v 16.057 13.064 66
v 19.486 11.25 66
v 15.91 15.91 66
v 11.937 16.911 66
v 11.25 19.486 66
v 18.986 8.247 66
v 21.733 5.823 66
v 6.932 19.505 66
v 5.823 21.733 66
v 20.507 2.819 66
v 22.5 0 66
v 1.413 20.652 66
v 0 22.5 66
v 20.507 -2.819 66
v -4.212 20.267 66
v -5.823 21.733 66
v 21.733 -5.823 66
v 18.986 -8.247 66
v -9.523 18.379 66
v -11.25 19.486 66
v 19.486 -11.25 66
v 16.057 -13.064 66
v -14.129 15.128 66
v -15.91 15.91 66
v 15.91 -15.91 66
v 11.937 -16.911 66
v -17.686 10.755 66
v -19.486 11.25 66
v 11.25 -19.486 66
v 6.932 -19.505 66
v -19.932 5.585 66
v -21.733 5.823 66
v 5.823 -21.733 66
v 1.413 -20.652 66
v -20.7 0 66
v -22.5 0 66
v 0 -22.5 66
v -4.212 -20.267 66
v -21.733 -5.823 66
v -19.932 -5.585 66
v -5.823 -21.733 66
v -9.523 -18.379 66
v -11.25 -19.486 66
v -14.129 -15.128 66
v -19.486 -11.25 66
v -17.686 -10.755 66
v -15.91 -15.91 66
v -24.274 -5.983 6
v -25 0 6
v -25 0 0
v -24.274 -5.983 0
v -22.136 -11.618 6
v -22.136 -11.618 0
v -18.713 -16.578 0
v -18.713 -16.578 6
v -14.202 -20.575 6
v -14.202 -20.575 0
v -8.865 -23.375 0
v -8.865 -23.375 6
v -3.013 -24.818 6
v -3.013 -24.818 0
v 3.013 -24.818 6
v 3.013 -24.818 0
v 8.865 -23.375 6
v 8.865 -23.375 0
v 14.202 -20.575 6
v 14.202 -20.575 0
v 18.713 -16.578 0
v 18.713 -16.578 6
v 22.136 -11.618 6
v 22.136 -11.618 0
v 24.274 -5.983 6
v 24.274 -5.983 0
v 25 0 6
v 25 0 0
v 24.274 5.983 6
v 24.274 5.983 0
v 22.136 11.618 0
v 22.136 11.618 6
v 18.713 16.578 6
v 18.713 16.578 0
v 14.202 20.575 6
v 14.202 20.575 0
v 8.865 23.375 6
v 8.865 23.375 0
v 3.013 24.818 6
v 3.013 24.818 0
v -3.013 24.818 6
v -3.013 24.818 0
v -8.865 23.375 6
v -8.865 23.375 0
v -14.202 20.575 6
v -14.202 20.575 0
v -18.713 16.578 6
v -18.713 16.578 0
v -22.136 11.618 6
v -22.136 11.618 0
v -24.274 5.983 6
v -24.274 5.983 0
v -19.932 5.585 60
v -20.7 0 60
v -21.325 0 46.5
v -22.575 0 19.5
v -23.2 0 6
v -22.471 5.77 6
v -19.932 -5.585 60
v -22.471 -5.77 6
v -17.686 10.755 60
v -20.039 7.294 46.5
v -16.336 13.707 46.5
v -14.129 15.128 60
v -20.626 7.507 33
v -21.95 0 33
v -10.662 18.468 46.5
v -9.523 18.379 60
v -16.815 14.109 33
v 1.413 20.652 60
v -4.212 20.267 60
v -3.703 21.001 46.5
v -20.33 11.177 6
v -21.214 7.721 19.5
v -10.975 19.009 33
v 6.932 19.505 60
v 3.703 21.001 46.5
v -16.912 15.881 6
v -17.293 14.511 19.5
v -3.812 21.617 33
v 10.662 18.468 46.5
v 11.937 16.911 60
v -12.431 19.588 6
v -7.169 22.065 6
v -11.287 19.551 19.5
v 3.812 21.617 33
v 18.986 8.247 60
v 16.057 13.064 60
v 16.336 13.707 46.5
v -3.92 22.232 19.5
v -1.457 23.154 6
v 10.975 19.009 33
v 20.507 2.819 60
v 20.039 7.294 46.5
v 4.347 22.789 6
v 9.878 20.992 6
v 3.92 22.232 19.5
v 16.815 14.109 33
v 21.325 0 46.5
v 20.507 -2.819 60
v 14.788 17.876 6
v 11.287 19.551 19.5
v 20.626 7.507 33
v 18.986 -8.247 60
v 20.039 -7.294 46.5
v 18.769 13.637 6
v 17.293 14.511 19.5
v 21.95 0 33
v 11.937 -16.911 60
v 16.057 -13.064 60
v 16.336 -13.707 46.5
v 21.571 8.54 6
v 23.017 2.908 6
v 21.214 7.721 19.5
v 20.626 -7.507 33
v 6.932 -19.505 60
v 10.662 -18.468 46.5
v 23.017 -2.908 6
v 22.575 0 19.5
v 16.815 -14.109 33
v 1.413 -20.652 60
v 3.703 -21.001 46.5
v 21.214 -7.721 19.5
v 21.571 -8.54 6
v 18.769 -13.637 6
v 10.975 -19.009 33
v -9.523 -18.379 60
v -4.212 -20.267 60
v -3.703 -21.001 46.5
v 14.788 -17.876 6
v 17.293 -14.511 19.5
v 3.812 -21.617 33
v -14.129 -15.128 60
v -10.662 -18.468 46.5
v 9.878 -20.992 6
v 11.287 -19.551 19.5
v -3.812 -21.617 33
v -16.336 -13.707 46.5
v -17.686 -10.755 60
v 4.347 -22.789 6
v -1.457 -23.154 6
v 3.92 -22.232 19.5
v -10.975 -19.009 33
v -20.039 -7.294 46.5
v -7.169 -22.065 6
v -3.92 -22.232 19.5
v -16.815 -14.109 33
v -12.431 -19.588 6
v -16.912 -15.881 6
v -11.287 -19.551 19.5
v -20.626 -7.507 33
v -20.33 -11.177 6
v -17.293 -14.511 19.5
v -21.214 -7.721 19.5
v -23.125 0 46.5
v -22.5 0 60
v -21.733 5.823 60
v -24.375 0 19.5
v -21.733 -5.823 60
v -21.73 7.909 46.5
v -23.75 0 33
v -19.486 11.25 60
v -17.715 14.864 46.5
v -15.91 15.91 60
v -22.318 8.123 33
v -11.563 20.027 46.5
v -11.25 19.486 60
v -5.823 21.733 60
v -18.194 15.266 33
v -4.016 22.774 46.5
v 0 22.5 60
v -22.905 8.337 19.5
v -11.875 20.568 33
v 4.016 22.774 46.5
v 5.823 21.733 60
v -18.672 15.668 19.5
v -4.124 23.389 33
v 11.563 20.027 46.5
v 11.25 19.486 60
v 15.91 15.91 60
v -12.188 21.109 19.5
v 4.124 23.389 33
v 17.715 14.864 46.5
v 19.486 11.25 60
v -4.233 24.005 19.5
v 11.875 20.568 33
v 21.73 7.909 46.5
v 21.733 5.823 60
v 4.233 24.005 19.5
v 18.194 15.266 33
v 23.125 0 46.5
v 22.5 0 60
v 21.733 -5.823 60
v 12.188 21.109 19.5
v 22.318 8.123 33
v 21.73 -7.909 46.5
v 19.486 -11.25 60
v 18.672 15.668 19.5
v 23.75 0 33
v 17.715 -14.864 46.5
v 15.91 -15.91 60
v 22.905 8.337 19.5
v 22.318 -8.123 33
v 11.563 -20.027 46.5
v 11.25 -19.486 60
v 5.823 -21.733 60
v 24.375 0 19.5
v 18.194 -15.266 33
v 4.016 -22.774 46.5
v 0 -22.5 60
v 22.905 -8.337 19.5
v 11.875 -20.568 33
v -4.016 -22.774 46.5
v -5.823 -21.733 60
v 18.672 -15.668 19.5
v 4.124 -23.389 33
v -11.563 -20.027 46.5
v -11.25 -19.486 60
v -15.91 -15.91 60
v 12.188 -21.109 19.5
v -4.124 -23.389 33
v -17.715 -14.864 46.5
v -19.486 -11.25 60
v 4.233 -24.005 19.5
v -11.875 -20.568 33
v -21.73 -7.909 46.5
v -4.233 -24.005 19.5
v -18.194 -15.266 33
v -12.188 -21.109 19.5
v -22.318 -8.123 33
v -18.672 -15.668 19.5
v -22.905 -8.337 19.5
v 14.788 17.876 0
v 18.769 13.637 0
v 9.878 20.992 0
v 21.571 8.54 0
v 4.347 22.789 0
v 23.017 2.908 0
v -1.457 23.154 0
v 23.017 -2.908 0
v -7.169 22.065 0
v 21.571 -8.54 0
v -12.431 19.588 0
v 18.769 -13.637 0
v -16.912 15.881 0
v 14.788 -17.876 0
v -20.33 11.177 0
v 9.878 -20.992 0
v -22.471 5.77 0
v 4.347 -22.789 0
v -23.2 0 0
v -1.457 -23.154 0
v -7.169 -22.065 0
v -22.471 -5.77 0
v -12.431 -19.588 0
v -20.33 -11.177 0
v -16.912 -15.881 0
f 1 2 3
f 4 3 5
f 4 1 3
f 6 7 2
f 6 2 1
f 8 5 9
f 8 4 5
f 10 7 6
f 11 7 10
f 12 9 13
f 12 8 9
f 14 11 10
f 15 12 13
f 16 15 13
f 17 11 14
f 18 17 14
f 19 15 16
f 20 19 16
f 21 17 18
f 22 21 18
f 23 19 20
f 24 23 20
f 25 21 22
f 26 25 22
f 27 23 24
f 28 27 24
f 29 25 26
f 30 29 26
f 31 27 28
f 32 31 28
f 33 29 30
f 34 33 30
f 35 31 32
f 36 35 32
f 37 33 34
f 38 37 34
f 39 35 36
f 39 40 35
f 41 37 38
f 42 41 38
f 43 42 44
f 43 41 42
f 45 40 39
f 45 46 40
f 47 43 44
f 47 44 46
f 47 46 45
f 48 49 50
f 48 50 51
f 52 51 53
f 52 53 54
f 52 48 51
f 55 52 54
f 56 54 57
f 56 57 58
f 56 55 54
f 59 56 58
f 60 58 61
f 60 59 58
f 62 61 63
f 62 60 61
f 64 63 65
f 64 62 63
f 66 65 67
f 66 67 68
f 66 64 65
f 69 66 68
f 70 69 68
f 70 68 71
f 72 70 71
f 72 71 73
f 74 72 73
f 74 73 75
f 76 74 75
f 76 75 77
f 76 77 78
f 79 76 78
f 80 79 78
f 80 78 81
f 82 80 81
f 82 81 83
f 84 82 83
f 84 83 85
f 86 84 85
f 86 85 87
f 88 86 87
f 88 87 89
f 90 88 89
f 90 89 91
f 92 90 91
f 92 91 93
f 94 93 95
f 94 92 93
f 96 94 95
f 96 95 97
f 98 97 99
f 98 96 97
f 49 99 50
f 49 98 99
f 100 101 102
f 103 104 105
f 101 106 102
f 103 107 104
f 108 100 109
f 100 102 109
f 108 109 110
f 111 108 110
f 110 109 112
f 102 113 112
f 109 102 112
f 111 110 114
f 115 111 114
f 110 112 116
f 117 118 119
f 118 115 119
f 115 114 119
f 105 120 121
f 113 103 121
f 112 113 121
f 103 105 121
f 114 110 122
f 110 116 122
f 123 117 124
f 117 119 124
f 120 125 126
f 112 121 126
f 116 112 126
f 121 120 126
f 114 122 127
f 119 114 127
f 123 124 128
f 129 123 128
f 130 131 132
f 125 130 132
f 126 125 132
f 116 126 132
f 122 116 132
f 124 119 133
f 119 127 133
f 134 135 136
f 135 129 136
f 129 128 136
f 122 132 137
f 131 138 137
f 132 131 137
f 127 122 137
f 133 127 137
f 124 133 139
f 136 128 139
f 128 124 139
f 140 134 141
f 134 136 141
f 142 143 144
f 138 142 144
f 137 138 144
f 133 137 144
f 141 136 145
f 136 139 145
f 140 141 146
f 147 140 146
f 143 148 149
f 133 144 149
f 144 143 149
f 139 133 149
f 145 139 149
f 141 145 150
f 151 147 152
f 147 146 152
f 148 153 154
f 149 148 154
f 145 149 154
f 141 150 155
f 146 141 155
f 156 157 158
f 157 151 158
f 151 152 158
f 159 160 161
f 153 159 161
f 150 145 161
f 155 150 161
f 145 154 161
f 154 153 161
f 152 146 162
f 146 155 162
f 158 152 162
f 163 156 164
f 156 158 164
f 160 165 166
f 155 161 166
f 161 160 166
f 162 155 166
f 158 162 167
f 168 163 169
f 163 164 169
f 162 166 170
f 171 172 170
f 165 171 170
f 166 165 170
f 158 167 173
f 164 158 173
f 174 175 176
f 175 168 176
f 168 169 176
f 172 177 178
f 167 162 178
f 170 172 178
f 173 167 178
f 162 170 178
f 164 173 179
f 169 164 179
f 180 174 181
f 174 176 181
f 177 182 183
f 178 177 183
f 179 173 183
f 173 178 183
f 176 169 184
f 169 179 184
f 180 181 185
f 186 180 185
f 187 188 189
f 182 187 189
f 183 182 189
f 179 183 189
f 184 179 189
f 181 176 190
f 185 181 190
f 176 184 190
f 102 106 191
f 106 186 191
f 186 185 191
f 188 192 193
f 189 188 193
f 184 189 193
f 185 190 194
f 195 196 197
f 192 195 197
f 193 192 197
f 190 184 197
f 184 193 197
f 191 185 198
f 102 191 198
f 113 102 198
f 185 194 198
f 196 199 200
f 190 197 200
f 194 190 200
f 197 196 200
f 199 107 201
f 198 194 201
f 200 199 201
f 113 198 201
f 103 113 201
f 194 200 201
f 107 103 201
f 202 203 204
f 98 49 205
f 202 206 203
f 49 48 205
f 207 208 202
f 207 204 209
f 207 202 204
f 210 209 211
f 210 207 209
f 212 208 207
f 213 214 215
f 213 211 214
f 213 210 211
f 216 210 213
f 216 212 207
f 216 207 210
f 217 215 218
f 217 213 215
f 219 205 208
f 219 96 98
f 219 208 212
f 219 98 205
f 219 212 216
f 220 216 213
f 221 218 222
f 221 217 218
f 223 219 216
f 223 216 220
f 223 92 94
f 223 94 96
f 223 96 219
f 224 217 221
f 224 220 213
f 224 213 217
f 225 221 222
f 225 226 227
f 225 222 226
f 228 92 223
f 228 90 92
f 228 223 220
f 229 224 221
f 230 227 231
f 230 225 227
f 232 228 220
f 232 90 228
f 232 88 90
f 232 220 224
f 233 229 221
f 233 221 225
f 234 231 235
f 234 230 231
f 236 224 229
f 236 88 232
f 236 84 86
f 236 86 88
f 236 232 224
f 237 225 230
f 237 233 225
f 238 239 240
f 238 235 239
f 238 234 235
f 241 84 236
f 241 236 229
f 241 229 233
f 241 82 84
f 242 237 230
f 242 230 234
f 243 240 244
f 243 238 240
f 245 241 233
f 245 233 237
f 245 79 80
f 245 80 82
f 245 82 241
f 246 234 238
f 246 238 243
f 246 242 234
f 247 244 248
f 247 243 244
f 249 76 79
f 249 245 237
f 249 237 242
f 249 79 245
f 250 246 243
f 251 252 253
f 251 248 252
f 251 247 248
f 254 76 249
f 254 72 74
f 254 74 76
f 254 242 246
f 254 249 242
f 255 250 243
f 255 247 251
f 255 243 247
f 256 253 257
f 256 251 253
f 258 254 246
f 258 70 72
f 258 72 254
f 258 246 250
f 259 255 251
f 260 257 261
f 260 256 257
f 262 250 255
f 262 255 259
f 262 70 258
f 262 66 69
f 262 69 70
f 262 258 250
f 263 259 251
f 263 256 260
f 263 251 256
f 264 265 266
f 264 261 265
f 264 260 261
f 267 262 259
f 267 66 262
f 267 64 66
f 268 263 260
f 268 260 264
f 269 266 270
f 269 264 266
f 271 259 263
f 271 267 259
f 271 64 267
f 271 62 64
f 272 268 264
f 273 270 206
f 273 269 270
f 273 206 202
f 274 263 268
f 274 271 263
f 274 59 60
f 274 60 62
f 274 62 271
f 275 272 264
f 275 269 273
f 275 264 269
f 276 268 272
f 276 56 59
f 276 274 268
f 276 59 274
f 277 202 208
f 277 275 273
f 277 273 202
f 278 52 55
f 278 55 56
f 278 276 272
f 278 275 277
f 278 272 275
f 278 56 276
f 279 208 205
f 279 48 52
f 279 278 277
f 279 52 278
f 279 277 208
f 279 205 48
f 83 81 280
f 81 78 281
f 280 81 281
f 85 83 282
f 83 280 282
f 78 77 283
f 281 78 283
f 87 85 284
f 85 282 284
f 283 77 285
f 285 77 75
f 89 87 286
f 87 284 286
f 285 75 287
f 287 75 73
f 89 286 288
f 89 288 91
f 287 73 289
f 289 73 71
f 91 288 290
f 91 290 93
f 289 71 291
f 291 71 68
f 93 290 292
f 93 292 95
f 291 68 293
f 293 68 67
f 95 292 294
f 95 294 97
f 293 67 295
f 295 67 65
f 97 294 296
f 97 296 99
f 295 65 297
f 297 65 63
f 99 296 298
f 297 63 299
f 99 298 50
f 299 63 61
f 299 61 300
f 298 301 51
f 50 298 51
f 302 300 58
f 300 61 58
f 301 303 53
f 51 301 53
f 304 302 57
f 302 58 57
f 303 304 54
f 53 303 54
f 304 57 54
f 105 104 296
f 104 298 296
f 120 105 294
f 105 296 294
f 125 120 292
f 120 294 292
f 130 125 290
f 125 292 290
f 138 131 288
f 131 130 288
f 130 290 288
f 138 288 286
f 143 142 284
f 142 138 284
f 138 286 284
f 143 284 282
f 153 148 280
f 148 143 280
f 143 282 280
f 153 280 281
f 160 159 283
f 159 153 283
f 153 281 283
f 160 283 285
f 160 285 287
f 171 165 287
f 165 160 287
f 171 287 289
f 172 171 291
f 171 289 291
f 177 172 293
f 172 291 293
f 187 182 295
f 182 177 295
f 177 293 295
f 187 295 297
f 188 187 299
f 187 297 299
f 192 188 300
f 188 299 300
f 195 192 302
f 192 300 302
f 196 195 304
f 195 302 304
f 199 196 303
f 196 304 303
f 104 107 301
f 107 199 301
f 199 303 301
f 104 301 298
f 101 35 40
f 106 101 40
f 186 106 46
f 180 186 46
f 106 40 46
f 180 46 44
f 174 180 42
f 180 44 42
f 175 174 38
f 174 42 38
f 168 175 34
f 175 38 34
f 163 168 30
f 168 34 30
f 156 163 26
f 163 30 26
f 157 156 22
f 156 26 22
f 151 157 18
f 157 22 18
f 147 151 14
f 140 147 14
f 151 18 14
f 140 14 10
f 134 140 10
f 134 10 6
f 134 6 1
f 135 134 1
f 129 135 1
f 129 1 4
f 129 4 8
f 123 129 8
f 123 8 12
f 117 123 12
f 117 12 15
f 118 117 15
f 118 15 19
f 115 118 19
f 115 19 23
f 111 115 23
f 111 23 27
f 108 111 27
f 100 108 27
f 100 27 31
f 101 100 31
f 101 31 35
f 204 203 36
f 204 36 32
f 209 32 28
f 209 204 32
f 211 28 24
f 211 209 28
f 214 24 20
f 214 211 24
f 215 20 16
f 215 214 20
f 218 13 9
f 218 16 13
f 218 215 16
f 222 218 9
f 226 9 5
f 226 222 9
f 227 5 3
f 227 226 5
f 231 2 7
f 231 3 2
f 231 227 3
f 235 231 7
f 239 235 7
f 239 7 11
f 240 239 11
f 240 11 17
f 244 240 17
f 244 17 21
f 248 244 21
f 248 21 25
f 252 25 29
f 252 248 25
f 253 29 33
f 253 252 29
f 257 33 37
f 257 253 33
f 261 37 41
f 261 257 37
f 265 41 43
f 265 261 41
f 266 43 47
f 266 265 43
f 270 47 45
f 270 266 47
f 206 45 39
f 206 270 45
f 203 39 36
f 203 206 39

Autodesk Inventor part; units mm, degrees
ref_plane "YZ Plane" through (0, 0, 0) normal (1, 0, 0) x (0, 1, 0)
ref_plane "XZ Plane" through (0, 0, 0) normal (0, 1, 0) x (-1, 0, 0)
ref_plane "XY Plane" through (0, 0, 0) normal (0, 0, 1) x (1, 0, 0)
sketch "Эскиз4" plane through (0, 0, 0) normal (0, 1, 0) x (-1, 0, 0)
  line L0 (20.7, 60) -> (23.2, 6)
  line L1 (25, 6) -> (22.5, 60)
  line L2 (0, -13.2) -> (0, 79.2) construction
  line L3 (25, 6) -> (23.2, 6) construction
  line L4 (23.2, 6) -> (23.2, 0)
  line L5 (23.2, 0) -> (25, 0)
  line L6 (25, 0) -> (25, 6)
  line L7 (22.5, 60) -> (20.7, 60) construction
  line L8 (20.7, 60) -> (20.7, 66)
  line L9 (20.7, 66) -> (22.5, 66)
  line L10 (22.5, 66) -> (22.5, 60)
  line L11 (25.86, 0) -> (19.84, 0) construction
  dimension "d11" = 25
  dimension "d13" = 22.5
  dimension "d16" = 6
  dimension "d17" = 1.8
  dimension "d18" = 66
revolve "Вращение1" add sketch "Эскиз4" angle 360 about axis through (0, 0, -10) along (0, 0, 1)
properties part number "Конусный барабан катушки"
